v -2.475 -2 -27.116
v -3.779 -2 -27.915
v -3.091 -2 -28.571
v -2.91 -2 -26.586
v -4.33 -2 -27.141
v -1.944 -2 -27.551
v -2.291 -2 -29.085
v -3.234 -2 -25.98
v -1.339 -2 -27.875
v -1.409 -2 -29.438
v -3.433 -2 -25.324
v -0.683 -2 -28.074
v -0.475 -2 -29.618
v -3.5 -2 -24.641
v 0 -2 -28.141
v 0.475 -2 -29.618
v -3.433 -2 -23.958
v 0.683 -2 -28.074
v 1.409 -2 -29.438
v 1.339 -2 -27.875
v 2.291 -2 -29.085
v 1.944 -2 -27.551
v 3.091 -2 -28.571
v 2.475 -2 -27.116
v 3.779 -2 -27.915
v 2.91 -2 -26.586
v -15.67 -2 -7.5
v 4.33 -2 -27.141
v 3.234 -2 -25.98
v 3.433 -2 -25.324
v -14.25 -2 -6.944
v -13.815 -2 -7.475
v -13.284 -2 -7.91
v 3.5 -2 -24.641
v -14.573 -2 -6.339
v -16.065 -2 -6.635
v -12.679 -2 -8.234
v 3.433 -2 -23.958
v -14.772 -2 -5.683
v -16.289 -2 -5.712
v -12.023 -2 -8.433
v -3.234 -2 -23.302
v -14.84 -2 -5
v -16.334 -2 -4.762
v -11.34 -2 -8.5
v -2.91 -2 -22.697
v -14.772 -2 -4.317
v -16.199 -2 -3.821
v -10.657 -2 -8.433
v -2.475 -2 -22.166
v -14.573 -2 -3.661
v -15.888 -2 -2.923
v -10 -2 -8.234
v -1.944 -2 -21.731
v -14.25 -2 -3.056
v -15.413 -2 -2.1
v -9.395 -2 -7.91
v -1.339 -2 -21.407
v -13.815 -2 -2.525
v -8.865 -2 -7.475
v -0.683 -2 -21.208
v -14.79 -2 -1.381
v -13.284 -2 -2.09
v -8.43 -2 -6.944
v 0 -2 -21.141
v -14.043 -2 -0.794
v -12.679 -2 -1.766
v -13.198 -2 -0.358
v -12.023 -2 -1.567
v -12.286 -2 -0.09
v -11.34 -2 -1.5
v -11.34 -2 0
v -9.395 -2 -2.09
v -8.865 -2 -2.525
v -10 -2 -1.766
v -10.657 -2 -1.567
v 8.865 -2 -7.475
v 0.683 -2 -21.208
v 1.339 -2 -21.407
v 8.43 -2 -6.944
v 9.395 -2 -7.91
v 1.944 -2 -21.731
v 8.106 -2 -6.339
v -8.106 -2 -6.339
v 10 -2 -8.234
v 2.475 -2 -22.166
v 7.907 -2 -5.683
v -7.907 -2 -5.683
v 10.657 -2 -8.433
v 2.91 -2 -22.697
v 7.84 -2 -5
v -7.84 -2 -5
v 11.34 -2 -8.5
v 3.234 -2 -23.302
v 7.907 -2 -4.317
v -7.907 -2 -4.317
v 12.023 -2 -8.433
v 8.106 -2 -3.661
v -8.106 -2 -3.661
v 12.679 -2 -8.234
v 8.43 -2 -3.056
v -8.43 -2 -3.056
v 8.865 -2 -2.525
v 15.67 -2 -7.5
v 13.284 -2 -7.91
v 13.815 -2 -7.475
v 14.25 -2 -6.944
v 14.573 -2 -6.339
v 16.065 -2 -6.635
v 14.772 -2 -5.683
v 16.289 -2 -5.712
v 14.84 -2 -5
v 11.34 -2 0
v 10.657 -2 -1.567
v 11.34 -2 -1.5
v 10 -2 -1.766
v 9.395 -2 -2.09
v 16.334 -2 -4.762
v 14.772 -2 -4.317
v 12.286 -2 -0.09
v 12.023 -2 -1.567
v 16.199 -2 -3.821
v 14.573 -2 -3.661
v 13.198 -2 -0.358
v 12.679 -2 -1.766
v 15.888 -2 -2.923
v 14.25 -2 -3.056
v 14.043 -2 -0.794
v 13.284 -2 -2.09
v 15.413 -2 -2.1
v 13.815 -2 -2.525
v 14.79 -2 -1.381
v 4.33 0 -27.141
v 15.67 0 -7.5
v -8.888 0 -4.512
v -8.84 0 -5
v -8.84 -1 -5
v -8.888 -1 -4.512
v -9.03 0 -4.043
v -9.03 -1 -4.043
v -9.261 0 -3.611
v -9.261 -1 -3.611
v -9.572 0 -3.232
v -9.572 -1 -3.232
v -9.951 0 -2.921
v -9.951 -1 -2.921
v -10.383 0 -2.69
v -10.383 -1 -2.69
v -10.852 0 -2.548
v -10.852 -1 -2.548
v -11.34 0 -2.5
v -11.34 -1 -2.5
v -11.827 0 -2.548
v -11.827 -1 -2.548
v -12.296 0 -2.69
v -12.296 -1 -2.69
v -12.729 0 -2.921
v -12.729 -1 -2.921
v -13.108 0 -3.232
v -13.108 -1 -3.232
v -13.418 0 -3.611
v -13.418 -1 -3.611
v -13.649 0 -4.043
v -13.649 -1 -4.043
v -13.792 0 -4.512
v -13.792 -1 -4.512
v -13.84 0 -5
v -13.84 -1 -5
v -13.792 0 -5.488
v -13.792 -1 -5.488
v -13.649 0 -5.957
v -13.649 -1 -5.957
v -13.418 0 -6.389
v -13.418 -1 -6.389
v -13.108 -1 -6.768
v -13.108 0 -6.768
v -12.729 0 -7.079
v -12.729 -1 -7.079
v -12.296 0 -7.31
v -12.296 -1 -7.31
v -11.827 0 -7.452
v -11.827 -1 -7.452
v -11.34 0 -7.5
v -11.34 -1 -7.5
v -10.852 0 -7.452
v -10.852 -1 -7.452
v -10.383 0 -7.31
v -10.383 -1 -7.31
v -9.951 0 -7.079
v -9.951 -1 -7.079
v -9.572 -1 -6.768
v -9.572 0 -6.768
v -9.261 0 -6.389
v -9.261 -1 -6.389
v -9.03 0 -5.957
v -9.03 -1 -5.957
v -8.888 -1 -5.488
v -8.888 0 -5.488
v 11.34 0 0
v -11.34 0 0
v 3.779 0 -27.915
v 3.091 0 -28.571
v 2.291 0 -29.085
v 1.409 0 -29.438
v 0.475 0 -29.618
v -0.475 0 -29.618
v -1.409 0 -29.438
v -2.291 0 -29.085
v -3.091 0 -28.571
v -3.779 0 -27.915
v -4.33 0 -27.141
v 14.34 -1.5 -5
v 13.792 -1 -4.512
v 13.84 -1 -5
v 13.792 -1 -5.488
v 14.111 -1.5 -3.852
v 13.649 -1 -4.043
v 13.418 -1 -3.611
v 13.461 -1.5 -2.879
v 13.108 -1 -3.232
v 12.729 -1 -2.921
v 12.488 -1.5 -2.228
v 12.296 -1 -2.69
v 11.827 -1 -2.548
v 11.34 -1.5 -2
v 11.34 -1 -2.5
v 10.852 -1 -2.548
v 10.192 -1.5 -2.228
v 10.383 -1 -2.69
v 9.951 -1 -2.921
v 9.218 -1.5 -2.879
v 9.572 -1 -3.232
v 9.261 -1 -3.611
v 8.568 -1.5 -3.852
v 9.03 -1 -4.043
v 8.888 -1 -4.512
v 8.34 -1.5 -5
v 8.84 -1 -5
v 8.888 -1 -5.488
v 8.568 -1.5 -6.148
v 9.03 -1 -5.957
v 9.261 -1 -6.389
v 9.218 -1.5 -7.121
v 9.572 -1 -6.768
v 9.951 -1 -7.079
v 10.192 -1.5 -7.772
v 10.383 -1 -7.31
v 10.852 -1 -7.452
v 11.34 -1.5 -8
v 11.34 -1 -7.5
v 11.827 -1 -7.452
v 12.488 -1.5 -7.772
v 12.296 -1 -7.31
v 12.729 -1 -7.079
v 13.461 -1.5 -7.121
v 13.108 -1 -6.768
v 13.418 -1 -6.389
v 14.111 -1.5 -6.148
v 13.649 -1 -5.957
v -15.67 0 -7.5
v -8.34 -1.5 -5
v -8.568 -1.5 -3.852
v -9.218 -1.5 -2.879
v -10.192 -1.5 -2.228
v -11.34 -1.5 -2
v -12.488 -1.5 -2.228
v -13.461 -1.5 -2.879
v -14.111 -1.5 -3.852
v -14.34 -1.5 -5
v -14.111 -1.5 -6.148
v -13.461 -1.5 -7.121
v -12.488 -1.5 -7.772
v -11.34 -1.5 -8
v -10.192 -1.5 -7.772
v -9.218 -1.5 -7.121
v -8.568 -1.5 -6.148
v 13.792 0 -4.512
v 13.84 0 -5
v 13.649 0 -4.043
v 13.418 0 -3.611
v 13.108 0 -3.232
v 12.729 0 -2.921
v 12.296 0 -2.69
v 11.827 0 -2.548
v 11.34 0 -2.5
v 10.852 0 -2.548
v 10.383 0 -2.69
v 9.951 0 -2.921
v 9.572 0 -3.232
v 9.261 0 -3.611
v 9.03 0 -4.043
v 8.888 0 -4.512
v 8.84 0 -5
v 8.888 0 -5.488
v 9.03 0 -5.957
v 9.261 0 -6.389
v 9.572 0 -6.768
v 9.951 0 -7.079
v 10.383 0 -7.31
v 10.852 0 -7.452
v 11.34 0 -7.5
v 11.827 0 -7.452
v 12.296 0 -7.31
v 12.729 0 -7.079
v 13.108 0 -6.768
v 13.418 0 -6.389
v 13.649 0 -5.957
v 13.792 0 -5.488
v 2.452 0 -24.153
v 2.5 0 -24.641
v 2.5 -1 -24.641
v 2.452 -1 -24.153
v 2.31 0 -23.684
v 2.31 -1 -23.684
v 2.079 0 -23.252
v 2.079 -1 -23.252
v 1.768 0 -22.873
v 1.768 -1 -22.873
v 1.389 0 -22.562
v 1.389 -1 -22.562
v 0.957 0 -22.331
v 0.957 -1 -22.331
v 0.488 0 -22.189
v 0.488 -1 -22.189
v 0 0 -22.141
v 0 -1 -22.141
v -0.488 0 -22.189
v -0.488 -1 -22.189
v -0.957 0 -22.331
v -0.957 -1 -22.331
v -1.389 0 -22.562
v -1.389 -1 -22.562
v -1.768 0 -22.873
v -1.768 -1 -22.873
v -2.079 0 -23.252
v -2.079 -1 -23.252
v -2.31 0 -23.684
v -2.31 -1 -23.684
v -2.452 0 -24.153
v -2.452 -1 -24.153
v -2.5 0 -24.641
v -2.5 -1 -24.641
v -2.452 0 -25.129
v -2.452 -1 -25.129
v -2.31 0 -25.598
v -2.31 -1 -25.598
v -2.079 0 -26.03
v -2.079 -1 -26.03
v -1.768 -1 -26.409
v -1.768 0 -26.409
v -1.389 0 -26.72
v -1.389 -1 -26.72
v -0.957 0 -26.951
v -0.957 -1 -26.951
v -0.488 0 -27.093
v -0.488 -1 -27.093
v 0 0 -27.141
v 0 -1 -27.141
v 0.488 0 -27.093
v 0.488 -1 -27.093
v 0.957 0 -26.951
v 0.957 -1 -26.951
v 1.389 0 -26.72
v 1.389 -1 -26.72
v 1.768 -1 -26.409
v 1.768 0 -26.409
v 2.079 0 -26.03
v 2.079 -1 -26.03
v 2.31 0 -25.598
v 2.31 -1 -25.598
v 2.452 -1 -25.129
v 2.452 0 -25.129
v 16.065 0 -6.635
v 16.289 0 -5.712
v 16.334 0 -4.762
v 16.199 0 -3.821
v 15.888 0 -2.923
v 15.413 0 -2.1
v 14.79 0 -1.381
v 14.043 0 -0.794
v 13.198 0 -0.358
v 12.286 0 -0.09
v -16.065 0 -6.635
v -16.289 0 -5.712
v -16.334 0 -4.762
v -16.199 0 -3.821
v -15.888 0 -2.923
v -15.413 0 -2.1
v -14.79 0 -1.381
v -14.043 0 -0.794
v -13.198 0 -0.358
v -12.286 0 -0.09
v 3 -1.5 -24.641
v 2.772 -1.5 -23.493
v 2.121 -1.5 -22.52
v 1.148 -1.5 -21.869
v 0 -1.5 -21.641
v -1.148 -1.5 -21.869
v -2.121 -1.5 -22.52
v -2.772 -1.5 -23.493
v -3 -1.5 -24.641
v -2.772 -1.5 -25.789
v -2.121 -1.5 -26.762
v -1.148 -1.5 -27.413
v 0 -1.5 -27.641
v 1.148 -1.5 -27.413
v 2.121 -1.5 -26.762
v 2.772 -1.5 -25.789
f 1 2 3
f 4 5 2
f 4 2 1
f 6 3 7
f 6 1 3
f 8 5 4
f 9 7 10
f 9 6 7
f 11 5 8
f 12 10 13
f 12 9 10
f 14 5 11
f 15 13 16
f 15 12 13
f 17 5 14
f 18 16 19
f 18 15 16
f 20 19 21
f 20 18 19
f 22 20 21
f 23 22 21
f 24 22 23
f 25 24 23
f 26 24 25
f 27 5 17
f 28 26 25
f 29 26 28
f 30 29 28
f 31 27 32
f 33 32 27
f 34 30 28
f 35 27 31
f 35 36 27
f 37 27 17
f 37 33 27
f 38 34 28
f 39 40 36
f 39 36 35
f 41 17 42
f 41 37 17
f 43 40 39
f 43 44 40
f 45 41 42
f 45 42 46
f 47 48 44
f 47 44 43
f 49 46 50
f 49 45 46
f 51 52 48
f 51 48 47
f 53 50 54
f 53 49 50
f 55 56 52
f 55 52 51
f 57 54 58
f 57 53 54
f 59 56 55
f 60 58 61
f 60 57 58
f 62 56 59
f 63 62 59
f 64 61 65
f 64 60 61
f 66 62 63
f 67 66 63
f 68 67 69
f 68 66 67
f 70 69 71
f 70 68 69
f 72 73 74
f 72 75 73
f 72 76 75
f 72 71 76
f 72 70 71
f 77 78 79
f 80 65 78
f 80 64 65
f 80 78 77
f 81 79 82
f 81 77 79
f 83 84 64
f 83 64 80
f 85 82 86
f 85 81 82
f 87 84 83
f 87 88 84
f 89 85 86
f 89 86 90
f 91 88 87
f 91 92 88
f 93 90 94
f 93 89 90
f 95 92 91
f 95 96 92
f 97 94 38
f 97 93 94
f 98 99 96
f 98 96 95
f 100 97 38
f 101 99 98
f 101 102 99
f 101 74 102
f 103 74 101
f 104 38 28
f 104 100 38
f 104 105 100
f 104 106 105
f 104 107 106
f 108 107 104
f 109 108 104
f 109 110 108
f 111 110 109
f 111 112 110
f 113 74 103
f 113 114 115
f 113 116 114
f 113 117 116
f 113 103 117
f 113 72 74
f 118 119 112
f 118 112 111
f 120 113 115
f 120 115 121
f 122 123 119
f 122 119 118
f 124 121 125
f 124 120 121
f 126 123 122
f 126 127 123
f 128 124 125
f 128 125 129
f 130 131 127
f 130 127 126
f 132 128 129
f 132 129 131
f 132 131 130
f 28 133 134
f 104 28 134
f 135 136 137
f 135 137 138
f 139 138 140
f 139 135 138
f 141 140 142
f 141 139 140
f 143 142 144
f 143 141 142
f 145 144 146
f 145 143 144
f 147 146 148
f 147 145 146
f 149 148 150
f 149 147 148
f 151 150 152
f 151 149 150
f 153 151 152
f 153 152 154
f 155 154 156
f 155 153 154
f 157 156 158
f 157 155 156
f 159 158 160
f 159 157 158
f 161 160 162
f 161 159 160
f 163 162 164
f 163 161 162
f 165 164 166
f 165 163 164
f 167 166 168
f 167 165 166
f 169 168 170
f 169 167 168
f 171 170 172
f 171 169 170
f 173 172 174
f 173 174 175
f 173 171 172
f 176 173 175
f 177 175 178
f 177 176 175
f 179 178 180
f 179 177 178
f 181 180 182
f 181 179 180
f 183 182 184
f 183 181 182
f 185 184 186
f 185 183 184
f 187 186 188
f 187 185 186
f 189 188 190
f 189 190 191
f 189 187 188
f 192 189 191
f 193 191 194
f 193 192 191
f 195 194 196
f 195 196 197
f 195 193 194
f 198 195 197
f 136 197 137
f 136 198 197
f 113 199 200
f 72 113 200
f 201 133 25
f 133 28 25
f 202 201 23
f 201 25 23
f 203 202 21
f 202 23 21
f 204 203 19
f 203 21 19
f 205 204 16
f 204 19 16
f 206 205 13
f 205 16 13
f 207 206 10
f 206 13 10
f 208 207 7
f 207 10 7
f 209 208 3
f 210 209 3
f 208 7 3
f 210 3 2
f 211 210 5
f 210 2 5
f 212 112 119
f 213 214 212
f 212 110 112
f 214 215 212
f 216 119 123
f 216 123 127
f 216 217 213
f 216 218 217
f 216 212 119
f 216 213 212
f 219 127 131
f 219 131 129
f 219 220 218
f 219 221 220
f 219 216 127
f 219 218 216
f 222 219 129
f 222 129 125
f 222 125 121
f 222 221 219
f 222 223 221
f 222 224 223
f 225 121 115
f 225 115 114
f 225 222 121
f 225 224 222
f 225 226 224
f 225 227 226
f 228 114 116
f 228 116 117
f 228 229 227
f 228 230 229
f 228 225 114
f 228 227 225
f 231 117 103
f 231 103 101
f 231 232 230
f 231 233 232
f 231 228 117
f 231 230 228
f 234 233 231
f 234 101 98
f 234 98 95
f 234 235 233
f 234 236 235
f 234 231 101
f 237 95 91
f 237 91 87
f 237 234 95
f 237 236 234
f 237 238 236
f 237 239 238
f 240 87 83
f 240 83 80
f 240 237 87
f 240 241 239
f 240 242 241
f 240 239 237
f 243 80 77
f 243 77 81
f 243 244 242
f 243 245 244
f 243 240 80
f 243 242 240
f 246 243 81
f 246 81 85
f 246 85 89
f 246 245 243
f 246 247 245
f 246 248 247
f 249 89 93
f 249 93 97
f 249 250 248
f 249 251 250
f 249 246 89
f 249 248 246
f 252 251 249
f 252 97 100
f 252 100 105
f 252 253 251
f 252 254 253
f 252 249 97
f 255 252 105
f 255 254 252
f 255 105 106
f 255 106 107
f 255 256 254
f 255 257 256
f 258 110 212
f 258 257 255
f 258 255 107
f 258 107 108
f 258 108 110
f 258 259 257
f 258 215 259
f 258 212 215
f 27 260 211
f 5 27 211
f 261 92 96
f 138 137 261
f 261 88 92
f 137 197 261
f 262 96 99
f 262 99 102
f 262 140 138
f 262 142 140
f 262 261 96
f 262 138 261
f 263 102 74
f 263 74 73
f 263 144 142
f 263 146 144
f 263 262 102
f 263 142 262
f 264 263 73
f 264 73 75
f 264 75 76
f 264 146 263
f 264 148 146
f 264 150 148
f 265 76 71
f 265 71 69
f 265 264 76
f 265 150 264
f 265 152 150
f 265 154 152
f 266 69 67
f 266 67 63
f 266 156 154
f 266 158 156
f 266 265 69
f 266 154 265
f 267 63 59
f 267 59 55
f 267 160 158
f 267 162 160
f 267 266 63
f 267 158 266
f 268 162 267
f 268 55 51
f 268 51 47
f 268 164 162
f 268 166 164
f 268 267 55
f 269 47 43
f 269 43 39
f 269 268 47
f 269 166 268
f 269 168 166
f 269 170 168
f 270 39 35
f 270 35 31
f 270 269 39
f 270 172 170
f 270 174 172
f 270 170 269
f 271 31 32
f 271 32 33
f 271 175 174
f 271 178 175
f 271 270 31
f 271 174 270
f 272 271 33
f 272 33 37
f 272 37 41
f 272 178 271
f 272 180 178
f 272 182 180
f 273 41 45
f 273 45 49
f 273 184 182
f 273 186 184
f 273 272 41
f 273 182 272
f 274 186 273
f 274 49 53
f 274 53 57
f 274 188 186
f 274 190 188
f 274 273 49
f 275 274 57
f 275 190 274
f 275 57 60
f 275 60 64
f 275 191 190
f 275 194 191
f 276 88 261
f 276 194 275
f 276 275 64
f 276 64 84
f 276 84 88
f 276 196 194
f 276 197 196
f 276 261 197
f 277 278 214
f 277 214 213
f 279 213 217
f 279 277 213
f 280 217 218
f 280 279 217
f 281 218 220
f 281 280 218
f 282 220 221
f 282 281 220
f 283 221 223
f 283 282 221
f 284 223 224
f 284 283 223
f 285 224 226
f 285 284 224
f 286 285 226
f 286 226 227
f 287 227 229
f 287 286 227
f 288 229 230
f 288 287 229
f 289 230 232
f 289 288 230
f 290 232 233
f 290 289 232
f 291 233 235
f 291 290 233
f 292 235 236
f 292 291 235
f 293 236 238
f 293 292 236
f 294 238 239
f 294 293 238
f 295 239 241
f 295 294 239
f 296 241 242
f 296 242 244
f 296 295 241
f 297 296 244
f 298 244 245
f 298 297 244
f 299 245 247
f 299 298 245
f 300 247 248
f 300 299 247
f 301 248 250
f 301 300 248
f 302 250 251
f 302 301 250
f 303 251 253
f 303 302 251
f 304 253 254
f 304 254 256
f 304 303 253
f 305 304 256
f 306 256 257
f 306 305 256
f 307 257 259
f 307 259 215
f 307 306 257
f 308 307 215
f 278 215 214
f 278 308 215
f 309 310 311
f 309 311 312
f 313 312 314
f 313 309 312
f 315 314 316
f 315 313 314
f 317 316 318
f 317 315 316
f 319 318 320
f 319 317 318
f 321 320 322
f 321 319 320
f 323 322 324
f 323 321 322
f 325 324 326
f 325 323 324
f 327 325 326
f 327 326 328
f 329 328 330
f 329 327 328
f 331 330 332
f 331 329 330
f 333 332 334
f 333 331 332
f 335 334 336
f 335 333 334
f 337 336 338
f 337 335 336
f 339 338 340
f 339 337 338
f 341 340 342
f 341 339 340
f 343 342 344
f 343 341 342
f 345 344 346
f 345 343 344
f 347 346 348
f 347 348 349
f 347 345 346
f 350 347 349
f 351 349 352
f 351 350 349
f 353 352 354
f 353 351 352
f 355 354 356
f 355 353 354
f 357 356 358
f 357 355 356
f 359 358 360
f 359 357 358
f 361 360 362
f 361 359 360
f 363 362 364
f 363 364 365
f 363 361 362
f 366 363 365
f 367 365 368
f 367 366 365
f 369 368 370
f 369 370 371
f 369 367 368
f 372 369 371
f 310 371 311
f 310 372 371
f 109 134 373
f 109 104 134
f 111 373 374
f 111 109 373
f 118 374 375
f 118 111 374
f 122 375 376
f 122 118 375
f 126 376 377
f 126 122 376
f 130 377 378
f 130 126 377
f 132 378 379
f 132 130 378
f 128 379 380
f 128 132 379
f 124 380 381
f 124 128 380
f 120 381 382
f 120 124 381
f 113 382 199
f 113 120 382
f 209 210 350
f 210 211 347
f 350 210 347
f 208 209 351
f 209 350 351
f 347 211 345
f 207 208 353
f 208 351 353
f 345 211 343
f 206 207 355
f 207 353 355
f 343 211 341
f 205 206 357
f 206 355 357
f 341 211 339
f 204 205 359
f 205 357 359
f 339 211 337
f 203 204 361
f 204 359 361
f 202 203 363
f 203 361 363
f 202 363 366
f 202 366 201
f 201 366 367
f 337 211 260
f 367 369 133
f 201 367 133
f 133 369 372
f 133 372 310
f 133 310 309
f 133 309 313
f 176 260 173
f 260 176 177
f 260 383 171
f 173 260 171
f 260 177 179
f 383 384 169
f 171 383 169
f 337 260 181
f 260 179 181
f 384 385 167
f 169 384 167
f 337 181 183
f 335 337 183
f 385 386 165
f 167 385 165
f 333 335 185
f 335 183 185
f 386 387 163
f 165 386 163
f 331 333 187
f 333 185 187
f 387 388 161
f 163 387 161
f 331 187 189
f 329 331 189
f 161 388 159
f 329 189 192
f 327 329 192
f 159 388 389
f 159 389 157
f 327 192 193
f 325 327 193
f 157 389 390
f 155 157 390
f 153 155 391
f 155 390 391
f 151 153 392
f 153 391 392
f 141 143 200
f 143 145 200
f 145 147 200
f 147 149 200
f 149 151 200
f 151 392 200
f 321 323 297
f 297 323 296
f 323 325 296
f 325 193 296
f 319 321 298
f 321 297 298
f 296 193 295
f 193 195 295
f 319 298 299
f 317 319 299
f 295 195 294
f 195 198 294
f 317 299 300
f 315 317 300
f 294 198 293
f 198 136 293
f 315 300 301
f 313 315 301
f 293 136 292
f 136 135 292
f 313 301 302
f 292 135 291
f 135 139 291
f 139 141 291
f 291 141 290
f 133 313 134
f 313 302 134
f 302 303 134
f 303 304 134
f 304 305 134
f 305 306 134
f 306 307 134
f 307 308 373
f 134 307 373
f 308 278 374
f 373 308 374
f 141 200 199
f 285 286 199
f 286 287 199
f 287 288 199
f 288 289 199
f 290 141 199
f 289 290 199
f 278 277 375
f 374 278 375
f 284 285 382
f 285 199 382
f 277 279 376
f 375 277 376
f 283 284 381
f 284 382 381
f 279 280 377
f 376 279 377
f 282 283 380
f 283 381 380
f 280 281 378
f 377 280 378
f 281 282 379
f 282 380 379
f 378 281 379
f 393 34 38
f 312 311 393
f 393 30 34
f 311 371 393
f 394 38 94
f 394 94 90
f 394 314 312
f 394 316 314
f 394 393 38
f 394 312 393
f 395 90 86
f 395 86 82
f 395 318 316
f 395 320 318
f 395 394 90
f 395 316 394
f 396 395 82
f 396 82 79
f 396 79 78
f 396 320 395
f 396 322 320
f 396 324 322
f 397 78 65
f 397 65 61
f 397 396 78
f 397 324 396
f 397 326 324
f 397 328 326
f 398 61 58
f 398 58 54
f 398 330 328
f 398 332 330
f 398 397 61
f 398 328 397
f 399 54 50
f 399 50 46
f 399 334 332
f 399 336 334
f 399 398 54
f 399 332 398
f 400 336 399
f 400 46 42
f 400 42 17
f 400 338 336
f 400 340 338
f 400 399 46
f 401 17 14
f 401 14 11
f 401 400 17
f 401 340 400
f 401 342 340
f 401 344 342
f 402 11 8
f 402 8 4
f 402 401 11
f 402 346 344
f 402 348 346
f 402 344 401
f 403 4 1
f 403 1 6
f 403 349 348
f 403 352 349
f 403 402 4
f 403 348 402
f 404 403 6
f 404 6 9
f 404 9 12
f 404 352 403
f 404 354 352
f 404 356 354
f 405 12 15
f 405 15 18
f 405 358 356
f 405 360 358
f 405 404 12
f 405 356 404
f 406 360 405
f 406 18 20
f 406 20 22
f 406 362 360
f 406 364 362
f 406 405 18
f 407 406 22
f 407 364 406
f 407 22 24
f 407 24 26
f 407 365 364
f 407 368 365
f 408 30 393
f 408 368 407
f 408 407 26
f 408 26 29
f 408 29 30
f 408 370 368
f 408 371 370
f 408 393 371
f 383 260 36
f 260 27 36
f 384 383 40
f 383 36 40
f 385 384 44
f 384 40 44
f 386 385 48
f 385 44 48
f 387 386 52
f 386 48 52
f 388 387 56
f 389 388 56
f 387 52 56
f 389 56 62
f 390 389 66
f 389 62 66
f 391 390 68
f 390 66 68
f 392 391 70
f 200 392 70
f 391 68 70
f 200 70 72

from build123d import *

# Parameters (mm, degrees)
F0_R     = 2.5
F1_DEPTH = 2
F2_R     = 5
F3_SIZE  = 1


with BuildPart() as f1:
    # F0 (on Front) → F1 (new body)
    with BuildSketch(Plane.XZ):
        Polygon((0, -34.641016), (20, 0), (-20, 0), align=None)
        with Locations((0, -24.641015)):
            Circle(F0_R, mode=Mode.SUBTRACT)
        with Locations((-11.339745, -5.000001)):
            Circle(F0_R, mode=Mode.SUBTRACT)
        with Locations((11.339745, -5.000001)):
            Circle(F0_R, mode=Mode.SUBTRACT)
    extrude(amount=F1_DEPTH)

    # F2
    f2_edges = [f1.edges().sort_by_distance(p)[0] for p in [
        (-20, -1, 0),
        (0, -1, -34.641016),
        (20, -1, 0),
    ]]
    fillet(f2_edges, radius=F2_R)

    # F3
    f3_edges = [f1.edges().sort_by_distance(p)[0] for p in [
        (-13.839745, -2, -5.000001),
        (8.839745, -2, -5.000001),
        (-2.5, -2, -24.641015),
    ]]
    chamfer(f3_edges, length=F3_SIZE)


solid = f1.part
